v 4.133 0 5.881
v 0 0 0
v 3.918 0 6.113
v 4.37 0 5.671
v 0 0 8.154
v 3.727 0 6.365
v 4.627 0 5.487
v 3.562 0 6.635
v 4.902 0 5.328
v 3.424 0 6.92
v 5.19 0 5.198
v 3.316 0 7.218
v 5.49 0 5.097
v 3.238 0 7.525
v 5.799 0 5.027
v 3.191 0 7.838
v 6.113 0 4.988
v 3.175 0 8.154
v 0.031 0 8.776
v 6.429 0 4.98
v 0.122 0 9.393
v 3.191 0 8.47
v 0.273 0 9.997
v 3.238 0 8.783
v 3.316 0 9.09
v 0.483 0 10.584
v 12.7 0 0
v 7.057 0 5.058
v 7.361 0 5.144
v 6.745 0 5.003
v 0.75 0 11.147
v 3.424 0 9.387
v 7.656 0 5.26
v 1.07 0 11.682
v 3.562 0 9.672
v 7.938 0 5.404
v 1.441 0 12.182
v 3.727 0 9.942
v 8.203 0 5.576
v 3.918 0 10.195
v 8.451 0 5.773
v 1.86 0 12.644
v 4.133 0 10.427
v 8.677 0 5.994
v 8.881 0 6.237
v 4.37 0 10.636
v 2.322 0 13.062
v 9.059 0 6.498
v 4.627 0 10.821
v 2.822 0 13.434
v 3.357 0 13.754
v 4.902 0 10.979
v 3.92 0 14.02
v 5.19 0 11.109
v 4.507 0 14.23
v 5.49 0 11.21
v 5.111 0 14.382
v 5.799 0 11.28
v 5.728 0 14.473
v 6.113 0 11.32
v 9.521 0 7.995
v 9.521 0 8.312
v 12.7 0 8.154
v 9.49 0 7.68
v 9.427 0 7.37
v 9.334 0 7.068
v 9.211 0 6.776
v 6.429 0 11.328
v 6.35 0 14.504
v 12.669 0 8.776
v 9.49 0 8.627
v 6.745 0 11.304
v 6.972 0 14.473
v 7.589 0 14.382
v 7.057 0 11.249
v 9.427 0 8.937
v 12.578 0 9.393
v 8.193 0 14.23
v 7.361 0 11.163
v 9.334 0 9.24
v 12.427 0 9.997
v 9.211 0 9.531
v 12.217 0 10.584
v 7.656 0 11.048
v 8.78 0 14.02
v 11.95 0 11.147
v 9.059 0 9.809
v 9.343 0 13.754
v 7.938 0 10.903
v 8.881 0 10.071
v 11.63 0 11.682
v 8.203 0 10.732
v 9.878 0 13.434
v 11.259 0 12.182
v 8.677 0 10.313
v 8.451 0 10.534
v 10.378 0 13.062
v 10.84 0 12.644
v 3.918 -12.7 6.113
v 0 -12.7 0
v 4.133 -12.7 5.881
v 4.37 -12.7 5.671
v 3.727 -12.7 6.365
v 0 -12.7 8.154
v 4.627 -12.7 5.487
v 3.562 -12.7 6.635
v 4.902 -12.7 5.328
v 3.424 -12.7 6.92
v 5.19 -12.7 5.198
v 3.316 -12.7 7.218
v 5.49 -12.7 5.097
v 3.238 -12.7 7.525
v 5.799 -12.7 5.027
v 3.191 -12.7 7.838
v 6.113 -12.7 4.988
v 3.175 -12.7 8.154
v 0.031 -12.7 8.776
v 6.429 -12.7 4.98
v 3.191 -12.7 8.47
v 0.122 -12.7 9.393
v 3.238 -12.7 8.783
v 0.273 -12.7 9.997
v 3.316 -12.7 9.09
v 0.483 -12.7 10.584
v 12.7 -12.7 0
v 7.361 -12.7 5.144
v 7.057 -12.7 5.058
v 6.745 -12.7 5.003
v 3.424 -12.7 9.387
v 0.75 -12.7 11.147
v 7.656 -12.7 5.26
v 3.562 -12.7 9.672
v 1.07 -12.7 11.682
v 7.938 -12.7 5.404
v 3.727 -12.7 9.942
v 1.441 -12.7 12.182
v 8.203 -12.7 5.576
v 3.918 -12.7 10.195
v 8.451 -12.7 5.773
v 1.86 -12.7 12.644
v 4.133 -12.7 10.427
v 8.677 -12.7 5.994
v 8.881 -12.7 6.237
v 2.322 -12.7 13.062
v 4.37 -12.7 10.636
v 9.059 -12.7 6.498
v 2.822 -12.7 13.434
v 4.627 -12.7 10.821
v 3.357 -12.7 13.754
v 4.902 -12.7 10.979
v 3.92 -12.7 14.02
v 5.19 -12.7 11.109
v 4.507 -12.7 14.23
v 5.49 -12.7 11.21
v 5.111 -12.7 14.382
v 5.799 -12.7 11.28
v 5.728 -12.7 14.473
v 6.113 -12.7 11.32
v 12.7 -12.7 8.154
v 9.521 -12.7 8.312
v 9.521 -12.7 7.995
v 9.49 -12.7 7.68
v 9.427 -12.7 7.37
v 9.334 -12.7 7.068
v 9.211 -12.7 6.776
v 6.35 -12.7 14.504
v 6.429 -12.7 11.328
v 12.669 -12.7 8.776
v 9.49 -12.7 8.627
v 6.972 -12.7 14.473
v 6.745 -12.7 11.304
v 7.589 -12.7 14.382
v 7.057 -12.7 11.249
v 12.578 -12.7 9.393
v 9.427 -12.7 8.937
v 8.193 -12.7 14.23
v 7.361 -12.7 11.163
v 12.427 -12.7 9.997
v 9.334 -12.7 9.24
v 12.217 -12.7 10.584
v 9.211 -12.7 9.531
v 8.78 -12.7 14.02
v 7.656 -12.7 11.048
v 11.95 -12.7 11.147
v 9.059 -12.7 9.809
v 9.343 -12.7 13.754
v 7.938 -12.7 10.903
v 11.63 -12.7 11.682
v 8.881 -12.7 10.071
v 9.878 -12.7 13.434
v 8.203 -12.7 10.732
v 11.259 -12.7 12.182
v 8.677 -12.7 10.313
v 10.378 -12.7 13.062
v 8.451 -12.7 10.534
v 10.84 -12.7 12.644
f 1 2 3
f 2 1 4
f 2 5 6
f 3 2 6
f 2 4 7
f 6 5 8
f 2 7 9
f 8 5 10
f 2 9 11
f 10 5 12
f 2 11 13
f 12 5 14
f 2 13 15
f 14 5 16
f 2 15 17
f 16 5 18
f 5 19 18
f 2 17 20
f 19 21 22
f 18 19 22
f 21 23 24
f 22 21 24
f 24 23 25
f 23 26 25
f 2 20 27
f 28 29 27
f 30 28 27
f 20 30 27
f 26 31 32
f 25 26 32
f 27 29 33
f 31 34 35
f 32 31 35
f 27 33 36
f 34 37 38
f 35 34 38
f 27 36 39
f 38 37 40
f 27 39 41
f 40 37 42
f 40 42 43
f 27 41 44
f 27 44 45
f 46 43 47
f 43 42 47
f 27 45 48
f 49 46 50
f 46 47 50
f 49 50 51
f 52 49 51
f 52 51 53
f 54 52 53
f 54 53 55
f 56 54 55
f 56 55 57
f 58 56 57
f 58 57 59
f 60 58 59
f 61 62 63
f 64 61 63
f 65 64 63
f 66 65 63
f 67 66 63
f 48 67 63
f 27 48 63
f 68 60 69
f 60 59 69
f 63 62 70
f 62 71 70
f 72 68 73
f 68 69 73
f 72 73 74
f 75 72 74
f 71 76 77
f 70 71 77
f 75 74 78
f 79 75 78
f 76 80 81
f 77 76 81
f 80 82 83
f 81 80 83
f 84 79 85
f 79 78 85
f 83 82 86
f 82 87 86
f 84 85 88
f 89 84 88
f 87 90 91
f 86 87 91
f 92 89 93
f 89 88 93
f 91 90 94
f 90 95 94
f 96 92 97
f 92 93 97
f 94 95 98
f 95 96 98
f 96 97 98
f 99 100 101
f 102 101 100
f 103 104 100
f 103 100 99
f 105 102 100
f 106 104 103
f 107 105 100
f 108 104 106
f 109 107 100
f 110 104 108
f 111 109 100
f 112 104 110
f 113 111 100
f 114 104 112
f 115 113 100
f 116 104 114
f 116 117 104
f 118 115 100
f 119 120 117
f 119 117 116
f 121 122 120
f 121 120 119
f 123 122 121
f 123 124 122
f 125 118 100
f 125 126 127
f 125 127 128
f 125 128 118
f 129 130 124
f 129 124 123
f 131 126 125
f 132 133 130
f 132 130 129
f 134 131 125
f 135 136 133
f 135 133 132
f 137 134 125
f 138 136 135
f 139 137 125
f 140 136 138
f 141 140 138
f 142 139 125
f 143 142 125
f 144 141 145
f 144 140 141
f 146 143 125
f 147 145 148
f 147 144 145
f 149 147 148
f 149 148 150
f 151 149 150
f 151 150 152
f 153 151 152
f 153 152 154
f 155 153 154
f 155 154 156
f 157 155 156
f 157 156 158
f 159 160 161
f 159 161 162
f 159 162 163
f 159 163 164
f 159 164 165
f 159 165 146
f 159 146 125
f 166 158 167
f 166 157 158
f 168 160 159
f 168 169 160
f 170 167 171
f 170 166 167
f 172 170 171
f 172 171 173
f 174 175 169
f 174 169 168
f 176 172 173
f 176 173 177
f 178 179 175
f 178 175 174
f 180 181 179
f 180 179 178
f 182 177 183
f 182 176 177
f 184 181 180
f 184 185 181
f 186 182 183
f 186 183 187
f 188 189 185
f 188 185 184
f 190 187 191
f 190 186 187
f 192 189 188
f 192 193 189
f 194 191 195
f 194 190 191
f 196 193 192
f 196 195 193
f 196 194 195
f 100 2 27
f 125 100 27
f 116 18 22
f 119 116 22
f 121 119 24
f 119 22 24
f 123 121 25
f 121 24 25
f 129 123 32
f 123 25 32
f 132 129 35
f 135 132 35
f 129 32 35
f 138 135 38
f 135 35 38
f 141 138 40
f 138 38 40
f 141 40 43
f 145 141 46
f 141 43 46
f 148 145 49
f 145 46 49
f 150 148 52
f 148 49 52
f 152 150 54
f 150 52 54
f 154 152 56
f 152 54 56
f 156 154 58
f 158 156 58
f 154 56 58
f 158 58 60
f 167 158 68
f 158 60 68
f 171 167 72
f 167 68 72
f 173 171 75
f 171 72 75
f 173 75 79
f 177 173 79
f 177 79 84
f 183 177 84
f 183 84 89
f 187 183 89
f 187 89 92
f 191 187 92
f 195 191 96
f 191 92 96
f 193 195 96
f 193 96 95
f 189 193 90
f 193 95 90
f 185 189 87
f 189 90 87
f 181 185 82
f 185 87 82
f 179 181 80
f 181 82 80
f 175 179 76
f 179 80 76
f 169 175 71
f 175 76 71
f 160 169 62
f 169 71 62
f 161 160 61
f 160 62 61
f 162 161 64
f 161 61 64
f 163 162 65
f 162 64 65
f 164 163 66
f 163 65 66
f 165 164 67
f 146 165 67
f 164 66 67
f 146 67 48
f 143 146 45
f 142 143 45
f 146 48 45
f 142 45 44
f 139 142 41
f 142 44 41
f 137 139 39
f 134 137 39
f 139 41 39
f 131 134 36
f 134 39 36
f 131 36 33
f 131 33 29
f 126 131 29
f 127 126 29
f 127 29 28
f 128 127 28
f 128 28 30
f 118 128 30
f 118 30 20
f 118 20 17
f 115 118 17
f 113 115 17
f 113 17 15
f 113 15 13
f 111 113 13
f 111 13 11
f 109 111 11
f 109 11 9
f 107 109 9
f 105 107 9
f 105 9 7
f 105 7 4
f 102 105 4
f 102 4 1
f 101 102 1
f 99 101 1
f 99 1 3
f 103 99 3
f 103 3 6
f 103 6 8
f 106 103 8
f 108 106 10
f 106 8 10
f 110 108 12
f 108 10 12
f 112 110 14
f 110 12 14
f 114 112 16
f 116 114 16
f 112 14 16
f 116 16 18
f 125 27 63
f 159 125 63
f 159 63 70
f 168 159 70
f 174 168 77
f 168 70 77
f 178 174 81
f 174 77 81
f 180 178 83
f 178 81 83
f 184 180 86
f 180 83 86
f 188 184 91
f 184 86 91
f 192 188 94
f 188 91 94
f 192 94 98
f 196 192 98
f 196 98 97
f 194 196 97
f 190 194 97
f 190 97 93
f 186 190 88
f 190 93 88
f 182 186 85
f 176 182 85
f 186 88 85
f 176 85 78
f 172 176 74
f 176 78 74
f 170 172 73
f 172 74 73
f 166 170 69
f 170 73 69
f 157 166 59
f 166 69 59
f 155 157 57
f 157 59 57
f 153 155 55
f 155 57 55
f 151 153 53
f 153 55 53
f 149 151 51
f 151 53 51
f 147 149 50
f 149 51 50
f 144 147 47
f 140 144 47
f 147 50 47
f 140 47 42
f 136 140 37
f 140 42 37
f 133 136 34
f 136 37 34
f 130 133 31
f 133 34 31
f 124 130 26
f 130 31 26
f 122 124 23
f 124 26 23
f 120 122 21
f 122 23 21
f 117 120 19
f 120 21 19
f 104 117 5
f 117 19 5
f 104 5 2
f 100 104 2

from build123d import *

# Parameters (mm, degrees)
F1_DEPTH = 12.7


with BuildPart() as f1:
    # F0 (on Front) → F1 (new body)
    with BuildSketch(Plane.XZ):
        with BuildLine():
            Line((0, 8.153695), (0, 0))
            Line((0, 0), (12.7, 0))
            Line((12.7, 0), (12.7, 8.153695))
            Line((12.7, 8.153695), (9.525, 8.153695))
            ThreePointArc((9.525, 8.153695), (6.35, 4.978695), (3.175, 8.153695))
            Line((3.175, 8.153695), (0, 8.153695))
        make_face()
        with BuildLine():
            ThreePointArc((12.7, 8.153695), (6.35, 14.503695), (0, 8.153695))
            Line((0, 8.153695), (3.175, 8.153695))
            ThreePointArc((3.175, 8.153695), (6.35, 11.328695), (9.525, 8.153695))
            Line((9.525, 8.153695), (12.7, 8.153695))
        make_face()
    extrude(amount=F1_DEPTH)


solid = f1.part
